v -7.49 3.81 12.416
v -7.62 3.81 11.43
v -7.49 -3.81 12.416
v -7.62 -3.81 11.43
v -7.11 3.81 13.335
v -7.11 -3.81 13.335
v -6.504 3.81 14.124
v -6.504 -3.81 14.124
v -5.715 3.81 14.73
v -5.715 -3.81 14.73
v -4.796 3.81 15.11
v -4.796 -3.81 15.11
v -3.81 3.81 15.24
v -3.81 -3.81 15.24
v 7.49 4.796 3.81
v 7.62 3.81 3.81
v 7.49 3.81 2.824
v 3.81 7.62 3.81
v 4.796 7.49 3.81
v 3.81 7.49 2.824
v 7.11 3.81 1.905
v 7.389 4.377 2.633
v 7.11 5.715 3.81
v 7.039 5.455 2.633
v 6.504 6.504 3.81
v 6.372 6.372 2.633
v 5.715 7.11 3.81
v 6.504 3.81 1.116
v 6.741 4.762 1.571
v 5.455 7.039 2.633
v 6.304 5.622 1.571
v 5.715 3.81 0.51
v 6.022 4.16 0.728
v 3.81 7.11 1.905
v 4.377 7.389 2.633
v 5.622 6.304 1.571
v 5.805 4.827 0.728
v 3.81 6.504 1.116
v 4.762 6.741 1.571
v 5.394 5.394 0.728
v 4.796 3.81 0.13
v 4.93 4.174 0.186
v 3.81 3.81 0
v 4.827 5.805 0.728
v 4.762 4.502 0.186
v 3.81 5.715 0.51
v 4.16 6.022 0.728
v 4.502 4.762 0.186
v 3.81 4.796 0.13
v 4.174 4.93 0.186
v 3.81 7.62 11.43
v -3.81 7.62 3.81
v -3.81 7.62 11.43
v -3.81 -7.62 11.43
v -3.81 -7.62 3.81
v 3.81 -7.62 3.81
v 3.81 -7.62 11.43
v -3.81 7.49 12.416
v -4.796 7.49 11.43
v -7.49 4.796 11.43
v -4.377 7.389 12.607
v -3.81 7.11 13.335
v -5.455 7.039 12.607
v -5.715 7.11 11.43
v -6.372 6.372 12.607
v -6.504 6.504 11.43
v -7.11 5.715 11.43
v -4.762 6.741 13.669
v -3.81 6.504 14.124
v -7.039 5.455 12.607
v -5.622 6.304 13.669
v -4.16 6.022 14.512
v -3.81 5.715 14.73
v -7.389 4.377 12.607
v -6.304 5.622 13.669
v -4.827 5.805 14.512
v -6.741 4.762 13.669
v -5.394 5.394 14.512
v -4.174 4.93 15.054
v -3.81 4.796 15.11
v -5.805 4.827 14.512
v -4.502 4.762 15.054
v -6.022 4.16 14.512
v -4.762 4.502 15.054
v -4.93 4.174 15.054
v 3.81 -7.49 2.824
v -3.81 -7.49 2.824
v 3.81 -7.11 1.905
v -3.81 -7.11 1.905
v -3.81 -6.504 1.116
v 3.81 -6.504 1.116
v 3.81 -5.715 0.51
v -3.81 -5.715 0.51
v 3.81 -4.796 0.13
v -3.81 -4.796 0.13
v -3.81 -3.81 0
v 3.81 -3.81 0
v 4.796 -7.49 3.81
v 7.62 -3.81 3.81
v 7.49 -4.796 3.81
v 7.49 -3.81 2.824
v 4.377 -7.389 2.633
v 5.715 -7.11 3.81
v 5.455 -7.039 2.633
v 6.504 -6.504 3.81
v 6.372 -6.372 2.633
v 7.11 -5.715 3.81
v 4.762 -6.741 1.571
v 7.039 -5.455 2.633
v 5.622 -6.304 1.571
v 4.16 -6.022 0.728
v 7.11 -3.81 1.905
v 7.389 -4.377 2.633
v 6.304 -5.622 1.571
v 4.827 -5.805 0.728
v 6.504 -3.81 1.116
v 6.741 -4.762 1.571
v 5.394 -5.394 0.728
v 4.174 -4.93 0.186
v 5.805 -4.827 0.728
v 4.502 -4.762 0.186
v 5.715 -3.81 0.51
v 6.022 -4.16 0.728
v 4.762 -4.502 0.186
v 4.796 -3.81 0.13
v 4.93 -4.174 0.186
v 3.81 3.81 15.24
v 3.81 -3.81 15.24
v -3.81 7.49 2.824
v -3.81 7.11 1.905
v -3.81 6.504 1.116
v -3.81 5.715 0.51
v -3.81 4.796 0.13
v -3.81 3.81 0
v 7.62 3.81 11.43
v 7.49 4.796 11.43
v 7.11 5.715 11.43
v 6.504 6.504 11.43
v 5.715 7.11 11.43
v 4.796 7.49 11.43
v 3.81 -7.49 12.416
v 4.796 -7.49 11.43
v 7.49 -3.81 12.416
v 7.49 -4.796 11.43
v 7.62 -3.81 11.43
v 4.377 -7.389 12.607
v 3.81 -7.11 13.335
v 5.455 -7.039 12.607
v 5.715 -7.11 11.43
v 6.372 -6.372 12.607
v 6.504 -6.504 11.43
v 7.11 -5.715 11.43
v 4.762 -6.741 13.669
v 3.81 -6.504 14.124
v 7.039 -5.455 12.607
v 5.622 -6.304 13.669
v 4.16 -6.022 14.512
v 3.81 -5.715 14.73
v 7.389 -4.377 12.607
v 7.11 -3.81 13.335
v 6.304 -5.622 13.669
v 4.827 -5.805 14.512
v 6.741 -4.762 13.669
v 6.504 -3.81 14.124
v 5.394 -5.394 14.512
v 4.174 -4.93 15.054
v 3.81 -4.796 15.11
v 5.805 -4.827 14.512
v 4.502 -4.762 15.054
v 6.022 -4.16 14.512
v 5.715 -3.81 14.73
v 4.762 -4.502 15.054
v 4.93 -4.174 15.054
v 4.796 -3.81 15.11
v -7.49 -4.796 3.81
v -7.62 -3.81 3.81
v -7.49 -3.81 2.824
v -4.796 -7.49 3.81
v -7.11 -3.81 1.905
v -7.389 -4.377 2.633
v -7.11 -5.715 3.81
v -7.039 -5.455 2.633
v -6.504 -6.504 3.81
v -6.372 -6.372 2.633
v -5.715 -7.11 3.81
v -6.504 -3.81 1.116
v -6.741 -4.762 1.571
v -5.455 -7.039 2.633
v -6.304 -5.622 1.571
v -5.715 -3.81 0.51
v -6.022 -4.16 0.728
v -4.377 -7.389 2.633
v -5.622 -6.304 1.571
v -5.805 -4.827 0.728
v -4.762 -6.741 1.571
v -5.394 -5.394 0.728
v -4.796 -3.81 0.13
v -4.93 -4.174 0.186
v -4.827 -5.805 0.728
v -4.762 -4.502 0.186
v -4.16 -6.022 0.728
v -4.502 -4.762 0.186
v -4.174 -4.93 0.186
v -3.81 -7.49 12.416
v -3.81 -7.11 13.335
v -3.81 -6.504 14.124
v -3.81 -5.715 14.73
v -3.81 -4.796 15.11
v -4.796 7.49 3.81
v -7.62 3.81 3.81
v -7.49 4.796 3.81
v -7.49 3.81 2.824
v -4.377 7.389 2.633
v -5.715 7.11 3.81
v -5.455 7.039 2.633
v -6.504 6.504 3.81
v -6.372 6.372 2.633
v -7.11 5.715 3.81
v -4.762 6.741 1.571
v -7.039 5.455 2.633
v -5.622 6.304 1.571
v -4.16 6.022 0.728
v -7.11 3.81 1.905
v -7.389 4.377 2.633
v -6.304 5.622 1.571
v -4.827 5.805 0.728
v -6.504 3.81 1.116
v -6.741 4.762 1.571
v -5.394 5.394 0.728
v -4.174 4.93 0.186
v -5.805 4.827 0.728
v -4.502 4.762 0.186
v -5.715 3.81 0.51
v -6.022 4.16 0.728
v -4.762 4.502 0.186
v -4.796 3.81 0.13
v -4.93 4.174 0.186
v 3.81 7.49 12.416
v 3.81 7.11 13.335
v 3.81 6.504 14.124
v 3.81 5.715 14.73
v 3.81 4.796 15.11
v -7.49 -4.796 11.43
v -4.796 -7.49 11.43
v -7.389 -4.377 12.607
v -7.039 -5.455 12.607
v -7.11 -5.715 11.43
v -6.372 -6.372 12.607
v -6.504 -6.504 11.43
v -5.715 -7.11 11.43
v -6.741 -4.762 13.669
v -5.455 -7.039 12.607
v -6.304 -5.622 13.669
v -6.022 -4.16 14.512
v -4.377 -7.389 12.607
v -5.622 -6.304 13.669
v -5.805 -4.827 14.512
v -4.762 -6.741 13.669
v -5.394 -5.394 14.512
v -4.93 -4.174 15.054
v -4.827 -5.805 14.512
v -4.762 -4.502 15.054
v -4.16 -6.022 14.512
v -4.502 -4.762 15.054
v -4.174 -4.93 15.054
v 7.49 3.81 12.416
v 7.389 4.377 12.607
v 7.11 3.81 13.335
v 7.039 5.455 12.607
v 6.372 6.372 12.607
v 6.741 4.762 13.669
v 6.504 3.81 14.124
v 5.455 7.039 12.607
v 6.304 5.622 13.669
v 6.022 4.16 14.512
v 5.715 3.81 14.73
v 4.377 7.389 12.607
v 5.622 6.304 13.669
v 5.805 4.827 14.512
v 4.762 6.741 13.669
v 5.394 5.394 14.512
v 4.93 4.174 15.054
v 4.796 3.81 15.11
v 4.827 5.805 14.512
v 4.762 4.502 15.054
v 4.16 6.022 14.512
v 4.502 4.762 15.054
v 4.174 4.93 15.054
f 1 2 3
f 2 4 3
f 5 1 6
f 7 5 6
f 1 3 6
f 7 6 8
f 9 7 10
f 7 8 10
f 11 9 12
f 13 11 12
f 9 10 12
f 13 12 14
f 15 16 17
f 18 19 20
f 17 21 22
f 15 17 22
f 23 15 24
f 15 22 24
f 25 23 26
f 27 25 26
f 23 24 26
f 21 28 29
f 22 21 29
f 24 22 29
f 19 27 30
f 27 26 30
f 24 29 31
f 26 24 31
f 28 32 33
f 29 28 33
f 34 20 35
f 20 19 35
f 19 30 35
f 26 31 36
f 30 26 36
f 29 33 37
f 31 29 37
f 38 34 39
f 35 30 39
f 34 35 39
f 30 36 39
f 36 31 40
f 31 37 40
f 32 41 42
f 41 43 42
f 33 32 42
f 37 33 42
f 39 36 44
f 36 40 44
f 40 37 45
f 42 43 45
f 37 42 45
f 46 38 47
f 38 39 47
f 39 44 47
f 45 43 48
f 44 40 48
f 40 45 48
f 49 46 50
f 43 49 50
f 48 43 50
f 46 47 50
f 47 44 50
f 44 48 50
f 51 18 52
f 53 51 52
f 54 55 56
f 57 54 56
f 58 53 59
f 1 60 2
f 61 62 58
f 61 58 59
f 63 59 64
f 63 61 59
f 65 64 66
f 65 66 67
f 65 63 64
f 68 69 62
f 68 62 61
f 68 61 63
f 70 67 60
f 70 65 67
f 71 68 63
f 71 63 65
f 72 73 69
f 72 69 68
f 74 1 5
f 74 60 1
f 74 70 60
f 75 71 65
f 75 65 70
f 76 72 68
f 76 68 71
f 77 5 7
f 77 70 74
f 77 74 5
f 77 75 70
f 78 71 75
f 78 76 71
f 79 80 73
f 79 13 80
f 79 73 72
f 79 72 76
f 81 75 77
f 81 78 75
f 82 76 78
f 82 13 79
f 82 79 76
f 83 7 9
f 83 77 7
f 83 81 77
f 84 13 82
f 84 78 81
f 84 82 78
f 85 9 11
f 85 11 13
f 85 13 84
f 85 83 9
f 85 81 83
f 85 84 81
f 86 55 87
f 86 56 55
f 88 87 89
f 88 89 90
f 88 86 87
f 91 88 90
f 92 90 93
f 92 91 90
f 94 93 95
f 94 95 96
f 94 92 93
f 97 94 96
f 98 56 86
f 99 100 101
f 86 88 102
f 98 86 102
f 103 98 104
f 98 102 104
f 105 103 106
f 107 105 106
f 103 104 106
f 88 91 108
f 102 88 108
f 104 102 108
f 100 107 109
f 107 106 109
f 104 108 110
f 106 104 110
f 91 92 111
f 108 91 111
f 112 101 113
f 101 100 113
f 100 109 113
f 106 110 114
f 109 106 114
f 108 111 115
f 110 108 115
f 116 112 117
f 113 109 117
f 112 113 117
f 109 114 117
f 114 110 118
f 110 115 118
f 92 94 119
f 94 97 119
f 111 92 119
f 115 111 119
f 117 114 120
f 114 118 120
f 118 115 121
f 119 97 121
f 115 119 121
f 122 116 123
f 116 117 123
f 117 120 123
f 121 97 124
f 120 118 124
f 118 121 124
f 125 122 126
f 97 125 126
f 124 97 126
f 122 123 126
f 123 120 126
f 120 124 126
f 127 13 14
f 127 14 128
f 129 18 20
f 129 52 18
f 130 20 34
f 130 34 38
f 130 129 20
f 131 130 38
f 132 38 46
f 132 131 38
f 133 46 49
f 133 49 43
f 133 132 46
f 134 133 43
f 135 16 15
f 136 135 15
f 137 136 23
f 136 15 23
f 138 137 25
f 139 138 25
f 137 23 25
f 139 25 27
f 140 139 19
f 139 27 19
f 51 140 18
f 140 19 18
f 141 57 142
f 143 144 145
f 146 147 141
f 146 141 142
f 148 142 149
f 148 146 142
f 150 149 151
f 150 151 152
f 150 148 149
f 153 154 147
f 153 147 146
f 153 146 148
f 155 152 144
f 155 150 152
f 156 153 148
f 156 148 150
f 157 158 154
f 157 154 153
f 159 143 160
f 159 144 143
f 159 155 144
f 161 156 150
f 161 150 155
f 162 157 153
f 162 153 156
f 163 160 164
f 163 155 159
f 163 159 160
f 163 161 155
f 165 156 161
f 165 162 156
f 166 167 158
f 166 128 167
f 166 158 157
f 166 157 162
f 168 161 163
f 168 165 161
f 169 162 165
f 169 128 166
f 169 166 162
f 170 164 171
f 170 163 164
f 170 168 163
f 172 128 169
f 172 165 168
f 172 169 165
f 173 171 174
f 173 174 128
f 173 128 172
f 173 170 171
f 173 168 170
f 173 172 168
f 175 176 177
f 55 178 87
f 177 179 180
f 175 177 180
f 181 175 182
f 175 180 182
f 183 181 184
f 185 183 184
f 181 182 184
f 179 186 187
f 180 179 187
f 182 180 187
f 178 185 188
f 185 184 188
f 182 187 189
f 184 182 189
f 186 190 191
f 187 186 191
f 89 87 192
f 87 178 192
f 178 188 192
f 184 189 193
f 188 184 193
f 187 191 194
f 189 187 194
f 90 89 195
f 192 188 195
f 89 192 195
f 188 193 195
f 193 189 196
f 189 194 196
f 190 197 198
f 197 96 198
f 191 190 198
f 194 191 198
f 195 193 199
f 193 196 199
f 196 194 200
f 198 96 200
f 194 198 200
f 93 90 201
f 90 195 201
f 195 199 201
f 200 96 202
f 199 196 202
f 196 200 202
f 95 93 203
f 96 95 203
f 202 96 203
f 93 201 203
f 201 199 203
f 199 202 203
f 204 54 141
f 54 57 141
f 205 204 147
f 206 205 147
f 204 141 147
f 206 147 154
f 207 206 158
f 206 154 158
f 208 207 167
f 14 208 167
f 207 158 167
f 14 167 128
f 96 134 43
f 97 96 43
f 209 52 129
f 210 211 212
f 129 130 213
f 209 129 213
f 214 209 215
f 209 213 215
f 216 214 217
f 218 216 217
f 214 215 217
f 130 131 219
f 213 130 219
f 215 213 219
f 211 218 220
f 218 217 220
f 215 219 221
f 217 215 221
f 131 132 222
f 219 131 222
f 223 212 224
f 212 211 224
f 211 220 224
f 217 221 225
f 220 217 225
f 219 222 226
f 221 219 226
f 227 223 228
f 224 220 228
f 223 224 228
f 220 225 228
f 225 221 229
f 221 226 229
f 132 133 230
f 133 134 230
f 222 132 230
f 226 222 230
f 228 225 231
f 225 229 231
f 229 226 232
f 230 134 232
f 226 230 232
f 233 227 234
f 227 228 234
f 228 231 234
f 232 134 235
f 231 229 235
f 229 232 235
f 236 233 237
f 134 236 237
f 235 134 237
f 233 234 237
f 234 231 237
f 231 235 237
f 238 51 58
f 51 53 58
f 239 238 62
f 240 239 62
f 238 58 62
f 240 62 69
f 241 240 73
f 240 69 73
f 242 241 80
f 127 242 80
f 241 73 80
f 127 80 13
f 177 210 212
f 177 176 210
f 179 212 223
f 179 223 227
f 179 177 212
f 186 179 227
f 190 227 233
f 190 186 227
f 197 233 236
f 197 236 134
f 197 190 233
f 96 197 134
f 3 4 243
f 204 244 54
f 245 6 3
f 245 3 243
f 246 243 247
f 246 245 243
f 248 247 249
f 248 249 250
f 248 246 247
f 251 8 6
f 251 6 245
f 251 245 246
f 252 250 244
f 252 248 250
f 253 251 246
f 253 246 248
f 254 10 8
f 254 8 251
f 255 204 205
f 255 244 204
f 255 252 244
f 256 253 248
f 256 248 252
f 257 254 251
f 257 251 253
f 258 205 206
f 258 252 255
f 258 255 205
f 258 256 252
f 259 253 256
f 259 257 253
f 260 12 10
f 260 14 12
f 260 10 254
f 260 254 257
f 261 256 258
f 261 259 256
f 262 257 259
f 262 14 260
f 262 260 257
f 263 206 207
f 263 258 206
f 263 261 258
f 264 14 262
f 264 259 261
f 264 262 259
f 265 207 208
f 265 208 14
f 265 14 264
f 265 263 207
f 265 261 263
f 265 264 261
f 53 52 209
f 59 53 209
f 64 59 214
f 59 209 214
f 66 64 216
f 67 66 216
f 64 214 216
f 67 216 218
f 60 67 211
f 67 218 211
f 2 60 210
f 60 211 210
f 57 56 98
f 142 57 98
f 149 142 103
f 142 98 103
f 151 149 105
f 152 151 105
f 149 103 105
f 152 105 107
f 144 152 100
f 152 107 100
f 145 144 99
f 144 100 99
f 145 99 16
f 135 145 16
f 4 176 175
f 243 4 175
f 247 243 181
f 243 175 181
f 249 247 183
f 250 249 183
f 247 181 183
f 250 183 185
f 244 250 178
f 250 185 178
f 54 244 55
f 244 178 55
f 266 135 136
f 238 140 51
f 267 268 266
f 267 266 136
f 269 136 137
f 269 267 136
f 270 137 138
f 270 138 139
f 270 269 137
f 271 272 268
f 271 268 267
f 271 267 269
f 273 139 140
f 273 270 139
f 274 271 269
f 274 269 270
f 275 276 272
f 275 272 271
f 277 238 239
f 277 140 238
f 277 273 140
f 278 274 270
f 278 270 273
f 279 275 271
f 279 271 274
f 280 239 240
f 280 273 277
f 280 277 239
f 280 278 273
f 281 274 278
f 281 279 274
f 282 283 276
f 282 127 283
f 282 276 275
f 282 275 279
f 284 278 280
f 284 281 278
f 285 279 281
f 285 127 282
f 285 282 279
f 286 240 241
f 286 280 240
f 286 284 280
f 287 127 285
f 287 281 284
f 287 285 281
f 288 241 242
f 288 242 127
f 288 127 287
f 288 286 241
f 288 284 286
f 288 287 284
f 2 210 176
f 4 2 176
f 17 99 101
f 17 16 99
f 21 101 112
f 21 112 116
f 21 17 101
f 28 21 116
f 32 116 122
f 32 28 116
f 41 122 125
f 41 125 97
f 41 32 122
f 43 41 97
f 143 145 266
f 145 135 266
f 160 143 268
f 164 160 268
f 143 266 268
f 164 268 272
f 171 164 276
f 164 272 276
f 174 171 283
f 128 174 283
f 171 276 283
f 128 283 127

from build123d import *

# Parameters (mm, degrees)
F1_DEPTH = 15.24
F2_R     = 3.81


with BuildPart() as f1:
    # F0 (on Top) → F1 (new body)
    with BuildSketch(Plane.XY):
        with BuildLine():
            Line((-3.81, -7.62), (3.81, -7.62))
            ThreePointArc((3.81, -7.62), (6.5040768363, -6.5040768363), (7.62, -3.81))
            Line((7.62, -3.81), (7.62, 3.81))
            ThreePointArc((7.62, 3.81), (6.5040768363, 6.5040768363), (3.81, 7.62))
            Line((3.81, 7.62), (-3.81, 7.62))
            ThreePointArc((-3.81, 7.62), (-6.5040768363, 6.5040768363), (-7.62, 3.81))
            Line((-7.62, 3.81), (-7.62, -3.81))
            ThreePointArc((-7.62, -3.81), (-6.5040768363, -6.5040768363), (-3.81, -7.62))
        make_face()
    extrude(amount=F1_DEPTH)

    # F2
    f2_edges = [f1.edges().sort_by_distance(p)[0] for p in [
        (-7.62, 0, 15.24),
        (-6.504077, -6.504077, 15.24),
        (0, -7.62, 15.24),
        (6.504077, -6.504077, 15.24),
        (7.62, 0, 15.24),
        (6.504077, 6.504077, 15.24),
        (0, 7.62, 15.24),
        (-6.504077, 6.504077, 15.24),
        (-7.62, 0, 0),
        (-6.504077, -6.504077, 0),
        (0, -7.62, 0),
        (6.504077, -6.504077, 0),
        (7.62, 0, 0),
        (6.504077, 6.504077, 0),
        (0, 7.62, 0),
        (-6.504077, 6.504077, 0),
    ]]
    fillet(f2_edges, radius=F2_R)


solid = f1.part
